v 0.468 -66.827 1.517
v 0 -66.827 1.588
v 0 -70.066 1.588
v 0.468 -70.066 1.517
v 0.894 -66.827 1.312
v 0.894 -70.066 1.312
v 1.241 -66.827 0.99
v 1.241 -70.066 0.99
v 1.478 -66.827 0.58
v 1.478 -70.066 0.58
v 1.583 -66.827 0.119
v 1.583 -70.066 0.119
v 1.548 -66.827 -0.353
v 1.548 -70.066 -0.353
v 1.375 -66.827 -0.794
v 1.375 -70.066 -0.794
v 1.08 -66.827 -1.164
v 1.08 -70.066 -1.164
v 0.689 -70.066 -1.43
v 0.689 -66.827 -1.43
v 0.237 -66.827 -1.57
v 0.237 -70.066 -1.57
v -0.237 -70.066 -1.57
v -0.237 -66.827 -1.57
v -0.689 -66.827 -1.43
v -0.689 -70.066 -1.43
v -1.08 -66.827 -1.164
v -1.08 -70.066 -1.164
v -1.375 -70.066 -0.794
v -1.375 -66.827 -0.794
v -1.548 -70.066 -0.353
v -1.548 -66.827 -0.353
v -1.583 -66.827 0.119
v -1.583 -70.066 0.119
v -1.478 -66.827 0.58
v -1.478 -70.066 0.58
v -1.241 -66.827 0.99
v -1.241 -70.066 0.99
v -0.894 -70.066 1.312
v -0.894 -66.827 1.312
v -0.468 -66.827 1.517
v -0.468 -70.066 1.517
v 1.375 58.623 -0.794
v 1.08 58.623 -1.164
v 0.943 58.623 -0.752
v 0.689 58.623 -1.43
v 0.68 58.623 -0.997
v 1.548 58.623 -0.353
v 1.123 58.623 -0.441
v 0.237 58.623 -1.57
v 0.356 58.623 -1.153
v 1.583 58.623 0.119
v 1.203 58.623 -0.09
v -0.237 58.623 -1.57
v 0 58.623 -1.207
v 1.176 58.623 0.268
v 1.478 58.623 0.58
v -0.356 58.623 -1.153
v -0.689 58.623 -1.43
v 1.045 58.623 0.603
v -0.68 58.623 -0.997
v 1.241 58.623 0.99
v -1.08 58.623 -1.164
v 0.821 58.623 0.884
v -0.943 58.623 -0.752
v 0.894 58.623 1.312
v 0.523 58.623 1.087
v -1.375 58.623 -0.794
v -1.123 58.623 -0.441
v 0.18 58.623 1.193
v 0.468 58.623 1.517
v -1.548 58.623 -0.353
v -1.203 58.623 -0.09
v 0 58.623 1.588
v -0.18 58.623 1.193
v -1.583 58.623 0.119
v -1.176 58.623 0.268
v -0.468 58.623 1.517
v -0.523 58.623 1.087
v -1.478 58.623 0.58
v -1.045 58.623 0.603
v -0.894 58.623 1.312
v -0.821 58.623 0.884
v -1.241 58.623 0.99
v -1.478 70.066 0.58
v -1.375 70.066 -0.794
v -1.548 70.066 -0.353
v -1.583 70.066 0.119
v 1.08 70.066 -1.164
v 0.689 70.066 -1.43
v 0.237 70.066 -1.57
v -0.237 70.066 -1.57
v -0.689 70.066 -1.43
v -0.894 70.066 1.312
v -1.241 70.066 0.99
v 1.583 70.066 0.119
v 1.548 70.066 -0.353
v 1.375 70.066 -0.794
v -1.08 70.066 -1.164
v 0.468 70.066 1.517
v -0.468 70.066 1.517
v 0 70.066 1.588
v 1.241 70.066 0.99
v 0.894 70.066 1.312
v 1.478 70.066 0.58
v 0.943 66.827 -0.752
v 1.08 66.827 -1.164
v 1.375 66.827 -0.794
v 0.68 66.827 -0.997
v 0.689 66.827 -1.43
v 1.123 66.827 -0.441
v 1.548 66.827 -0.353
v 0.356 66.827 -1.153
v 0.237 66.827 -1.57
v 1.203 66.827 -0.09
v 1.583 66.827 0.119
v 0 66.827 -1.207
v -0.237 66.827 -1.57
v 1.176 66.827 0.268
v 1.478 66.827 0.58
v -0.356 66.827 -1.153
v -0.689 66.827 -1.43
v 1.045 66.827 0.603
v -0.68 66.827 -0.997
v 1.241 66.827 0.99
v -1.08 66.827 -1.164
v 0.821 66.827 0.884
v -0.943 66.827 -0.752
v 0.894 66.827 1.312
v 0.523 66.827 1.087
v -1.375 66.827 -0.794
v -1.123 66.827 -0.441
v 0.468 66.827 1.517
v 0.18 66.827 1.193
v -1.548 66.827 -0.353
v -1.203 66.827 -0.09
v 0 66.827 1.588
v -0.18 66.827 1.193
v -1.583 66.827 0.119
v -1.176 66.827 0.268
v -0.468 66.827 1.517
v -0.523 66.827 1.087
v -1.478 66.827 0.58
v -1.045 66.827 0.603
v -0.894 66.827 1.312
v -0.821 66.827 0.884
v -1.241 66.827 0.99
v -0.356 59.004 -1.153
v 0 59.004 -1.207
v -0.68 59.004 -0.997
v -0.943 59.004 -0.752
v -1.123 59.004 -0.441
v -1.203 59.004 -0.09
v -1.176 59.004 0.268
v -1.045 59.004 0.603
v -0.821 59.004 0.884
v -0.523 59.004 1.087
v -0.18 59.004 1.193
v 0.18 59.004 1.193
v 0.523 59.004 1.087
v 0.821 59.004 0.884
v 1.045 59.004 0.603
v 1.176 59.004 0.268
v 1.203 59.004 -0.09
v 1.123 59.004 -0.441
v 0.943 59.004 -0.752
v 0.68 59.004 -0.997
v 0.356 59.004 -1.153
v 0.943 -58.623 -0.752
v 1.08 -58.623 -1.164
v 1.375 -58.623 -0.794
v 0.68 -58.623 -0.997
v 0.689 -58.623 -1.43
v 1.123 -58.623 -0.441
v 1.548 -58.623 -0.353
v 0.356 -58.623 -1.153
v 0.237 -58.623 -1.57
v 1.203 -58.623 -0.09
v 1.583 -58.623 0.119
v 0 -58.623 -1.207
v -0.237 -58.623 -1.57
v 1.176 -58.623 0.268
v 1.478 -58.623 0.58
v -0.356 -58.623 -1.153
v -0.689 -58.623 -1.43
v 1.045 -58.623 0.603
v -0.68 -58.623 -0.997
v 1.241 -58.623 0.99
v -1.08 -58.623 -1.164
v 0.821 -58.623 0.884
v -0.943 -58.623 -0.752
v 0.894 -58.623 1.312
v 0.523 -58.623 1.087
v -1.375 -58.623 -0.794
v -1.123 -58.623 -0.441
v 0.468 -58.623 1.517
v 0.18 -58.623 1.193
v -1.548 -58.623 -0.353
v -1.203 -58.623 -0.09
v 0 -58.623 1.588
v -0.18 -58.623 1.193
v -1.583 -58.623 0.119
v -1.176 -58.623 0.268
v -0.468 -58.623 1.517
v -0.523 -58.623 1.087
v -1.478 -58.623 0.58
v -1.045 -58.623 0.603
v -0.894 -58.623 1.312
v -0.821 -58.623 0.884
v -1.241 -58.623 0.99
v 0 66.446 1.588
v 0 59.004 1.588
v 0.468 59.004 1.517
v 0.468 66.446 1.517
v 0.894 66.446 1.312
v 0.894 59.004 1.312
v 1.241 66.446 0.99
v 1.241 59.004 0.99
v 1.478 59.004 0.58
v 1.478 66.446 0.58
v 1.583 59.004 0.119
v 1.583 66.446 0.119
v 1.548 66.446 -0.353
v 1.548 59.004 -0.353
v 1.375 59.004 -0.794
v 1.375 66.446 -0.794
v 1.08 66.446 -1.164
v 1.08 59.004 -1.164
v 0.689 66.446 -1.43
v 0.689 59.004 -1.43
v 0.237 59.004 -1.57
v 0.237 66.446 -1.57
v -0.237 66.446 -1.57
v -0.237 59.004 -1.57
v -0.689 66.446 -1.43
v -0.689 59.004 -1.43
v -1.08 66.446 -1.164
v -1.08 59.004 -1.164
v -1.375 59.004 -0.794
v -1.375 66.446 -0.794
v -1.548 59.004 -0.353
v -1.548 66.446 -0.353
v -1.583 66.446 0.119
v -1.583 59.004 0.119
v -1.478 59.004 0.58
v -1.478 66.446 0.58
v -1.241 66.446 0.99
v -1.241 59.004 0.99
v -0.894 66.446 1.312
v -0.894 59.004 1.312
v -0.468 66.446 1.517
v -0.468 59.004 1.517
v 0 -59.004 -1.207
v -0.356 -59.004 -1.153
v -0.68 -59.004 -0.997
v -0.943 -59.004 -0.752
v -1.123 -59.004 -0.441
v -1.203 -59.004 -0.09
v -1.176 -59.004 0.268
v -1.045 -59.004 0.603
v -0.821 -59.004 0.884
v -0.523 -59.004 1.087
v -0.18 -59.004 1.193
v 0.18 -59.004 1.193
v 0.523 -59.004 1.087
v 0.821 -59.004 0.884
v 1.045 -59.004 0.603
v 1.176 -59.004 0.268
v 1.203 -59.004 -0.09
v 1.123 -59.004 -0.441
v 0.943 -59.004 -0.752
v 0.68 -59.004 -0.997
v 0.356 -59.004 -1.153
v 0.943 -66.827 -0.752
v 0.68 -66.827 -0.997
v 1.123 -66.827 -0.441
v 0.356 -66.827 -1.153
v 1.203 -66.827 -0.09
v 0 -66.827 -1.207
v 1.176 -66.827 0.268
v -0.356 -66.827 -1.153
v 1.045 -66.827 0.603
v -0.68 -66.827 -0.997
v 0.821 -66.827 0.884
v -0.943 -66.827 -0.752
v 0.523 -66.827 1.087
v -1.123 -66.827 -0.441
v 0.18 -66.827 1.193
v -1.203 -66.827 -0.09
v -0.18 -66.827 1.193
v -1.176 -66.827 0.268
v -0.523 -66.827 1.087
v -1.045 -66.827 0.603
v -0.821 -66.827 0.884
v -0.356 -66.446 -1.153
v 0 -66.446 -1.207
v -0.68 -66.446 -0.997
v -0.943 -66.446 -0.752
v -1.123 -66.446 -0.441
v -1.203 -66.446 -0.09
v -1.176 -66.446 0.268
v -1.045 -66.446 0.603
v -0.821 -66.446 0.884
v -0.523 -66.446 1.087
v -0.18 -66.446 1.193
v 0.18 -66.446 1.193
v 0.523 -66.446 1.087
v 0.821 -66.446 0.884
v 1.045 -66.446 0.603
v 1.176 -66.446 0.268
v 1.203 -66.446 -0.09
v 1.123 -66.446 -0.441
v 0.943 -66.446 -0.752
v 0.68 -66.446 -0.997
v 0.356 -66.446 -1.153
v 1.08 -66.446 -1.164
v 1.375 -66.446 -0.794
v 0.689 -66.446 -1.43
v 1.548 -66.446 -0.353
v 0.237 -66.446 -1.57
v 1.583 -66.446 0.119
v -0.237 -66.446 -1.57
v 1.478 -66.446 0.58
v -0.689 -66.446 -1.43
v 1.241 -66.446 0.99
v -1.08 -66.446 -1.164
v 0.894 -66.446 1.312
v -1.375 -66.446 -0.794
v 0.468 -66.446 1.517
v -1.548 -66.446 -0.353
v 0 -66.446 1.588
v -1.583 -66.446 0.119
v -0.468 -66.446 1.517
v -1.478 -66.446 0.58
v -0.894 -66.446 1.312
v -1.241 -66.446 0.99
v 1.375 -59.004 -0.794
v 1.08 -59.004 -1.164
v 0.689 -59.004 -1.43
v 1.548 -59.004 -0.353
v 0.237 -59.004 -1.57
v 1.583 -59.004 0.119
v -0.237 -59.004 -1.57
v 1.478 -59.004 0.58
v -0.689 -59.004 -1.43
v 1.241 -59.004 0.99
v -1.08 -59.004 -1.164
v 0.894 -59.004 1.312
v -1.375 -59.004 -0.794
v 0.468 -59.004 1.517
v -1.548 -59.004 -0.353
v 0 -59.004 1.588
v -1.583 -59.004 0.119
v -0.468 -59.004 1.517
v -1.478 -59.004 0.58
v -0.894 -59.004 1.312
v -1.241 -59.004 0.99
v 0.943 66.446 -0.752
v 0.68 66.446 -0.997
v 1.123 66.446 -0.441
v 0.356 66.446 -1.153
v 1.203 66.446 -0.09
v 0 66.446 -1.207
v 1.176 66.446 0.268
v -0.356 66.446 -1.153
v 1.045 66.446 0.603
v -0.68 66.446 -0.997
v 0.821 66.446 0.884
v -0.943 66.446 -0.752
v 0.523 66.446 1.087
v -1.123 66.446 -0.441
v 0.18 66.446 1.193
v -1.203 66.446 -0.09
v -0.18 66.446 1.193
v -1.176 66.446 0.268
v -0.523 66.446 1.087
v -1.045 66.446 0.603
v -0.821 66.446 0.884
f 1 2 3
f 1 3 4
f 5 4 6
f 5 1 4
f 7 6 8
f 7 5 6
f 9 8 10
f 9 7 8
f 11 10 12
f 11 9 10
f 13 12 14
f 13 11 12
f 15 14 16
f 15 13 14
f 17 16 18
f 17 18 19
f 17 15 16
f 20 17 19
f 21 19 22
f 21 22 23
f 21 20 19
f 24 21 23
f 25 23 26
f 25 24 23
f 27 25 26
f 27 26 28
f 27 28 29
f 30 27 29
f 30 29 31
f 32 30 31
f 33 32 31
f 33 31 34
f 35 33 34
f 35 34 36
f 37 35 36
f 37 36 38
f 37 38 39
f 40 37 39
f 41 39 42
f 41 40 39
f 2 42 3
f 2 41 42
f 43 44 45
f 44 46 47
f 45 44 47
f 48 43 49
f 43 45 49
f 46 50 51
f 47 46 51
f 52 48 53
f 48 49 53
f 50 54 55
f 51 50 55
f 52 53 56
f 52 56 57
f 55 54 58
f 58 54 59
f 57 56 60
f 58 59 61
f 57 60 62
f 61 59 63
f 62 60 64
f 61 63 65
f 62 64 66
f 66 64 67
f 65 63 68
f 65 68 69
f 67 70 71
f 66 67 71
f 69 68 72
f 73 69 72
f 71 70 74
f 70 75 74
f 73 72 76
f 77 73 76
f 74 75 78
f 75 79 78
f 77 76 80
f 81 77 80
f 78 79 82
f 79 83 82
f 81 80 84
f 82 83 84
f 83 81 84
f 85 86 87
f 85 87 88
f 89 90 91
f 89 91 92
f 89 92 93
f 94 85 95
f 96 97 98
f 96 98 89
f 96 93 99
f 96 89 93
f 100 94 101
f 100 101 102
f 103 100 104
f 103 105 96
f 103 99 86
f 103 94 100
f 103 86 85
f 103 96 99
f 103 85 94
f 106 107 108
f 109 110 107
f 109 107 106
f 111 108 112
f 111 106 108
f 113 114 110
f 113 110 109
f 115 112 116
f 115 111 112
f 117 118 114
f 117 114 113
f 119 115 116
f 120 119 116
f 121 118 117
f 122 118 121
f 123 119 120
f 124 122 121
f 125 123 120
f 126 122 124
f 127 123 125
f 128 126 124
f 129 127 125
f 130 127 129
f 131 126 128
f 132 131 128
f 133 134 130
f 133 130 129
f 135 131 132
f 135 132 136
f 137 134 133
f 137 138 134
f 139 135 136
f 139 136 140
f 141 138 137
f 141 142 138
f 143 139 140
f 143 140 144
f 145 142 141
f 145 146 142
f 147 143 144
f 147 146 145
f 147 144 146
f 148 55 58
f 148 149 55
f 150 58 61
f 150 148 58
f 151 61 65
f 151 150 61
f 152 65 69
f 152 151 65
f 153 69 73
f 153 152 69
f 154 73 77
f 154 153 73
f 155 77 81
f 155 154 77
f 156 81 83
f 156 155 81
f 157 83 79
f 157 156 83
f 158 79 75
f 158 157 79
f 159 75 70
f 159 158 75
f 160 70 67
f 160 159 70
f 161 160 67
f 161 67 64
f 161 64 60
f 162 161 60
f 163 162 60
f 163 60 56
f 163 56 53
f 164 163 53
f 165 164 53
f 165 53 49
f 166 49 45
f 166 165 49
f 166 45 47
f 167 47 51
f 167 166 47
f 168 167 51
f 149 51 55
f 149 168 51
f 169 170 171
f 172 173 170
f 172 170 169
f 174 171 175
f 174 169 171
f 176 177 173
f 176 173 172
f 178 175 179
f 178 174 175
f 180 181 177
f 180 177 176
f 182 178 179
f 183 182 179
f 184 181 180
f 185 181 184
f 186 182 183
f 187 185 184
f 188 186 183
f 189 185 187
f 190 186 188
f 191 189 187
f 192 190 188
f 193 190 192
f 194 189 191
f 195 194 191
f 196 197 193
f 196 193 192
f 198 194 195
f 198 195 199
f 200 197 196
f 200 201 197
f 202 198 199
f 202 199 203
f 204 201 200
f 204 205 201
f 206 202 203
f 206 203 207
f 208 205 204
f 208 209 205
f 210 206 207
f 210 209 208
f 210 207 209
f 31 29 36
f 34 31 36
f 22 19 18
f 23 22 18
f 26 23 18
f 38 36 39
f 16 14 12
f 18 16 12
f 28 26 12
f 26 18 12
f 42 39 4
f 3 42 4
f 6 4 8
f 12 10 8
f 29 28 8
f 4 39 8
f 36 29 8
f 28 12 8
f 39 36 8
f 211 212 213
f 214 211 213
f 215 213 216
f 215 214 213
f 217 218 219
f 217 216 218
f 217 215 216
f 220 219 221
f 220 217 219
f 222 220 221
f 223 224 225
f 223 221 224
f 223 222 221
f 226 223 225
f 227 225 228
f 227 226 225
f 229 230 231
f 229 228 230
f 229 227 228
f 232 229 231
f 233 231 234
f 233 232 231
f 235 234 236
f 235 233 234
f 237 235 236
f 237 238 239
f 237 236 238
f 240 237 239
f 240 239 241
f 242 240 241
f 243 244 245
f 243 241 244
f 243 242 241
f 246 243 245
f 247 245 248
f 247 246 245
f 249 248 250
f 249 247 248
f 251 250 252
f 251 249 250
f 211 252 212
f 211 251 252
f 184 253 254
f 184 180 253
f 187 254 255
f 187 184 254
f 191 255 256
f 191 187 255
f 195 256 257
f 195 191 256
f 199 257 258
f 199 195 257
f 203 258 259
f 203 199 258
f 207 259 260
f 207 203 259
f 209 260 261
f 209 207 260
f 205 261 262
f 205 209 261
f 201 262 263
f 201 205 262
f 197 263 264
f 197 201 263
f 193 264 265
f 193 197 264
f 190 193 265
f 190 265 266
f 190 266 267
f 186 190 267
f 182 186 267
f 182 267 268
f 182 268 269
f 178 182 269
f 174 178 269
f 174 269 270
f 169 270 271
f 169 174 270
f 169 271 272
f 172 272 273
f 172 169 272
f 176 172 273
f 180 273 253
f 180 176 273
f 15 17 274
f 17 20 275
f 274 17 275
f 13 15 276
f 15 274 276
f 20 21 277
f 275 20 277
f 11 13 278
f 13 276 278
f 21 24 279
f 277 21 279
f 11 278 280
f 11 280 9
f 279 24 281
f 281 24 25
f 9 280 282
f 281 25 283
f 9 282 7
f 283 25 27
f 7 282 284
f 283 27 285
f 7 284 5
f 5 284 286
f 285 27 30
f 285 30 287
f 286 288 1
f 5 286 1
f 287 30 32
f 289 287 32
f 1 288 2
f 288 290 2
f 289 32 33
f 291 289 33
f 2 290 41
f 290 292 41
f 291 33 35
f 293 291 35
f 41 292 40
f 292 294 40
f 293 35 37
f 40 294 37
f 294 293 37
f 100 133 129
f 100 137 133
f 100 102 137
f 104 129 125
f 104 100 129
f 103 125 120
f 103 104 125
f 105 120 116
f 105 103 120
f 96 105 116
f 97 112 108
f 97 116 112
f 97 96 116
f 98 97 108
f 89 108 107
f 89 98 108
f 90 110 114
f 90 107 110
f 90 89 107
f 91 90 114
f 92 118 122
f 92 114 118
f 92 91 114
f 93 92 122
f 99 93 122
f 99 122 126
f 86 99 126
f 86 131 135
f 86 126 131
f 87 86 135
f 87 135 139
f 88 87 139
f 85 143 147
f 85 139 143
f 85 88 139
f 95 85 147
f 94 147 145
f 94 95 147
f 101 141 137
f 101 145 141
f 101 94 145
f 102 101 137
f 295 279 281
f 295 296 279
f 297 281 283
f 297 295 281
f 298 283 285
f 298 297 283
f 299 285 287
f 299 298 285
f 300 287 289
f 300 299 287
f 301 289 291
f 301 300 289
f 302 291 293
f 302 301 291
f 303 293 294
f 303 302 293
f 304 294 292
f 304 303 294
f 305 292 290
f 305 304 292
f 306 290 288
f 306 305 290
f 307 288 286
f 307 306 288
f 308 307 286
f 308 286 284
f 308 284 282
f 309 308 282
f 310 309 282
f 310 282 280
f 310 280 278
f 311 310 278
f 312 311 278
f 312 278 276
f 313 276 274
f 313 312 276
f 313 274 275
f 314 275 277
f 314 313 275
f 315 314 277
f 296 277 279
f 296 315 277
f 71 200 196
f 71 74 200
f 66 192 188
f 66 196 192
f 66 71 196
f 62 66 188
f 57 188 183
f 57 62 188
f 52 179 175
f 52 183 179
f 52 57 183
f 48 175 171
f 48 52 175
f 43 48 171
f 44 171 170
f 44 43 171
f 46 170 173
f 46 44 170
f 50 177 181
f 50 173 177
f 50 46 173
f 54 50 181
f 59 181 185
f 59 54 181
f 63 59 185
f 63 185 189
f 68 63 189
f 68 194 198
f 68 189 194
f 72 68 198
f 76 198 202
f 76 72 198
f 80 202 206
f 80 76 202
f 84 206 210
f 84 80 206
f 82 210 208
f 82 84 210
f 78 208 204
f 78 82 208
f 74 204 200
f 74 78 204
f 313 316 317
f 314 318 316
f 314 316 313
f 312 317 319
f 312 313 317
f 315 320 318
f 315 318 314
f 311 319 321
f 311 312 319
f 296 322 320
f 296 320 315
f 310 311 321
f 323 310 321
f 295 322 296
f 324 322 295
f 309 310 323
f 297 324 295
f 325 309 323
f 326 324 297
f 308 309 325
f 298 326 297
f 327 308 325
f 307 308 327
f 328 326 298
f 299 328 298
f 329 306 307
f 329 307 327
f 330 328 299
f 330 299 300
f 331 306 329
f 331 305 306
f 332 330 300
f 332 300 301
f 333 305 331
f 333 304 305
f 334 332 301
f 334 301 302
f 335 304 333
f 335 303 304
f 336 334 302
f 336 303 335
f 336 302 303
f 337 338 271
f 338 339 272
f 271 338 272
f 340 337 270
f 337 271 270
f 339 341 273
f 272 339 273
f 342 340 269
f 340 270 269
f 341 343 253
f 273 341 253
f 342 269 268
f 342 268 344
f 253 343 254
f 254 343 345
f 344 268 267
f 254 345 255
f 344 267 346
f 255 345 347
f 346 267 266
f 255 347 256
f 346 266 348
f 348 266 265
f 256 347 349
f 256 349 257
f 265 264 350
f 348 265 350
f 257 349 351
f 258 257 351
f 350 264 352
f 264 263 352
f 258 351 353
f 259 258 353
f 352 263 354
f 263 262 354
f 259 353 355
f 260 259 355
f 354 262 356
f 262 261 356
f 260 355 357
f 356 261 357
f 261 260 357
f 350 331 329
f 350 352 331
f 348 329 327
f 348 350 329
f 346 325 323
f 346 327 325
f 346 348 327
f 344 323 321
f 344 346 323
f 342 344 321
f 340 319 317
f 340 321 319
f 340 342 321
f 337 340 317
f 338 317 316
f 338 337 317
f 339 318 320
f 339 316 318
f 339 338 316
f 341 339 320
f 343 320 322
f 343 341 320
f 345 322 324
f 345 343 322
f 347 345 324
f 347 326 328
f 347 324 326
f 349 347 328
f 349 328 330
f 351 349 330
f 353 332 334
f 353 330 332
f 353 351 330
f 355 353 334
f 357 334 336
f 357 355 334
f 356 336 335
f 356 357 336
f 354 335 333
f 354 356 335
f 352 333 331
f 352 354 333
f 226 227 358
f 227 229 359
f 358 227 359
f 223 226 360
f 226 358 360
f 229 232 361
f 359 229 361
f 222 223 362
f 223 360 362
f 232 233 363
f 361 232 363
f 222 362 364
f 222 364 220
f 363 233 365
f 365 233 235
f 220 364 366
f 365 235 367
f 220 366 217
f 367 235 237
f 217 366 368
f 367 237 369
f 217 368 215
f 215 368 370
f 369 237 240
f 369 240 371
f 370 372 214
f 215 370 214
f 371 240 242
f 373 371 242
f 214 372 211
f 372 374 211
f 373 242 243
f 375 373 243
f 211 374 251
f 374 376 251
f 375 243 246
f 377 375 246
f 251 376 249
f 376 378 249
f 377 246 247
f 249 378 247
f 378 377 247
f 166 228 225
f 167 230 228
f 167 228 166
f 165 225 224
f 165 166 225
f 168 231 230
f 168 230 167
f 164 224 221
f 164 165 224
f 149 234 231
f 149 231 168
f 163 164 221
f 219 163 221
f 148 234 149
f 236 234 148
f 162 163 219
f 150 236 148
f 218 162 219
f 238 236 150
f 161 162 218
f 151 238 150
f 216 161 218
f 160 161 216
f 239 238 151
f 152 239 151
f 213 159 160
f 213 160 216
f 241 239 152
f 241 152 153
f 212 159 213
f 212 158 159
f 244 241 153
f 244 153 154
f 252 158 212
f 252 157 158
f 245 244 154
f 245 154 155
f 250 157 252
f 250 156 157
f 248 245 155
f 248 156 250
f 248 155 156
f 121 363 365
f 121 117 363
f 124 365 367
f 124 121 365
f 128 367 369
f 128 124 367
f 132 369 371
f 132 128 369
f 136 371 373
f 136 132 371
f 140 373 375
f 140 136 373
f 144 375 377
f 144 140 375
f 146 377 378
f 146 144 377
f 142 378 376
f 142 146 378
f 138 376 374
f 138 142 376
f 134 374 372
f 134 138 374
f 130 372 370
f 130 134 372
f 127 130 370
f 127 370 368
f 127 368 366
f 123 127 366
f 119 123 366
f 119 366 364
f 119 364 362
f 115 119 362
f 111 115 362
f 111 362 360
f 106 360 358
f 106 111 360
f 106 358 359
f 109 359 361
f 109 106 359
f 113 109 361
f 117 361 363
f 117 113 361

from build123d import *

# Parameters (mm, degrees)
SKETCH1_R           = 1.5875
BOSS_EXTRUDE1_DEPTH = 70.0659
SKETCH2_W           = 0.381
SKETCH2_H           = 0.381


with BuildPart() as part:
    # Sketch1 → Boss-Extrude1 (new, symmetric)
    with BuildSketch(Plane(origin=(0, 0, 0), x_dir=(1, 0, 0), z_dir=(0, 1, 0))):
        with Locations(Location((0, 0, 0), (0, 0, 270))):
            Circle(SKETCH1_R)
    extrude(amount=BOSS_EXTRUDE1_DEPTH, both=True)

    # Sketch2 → Cut-Revolve1 (revolve, cut)
    with BuildSketch(Plane.XY, mode=Mode.PRIVATE) as cut_revolve1_sk:
        with Locations((1.397, 58.8137)):
            Rectangle(SKETCH2_W, SKETCH2_H)
        with Locations((1.397, -58.8137)):
            Rectangle(SKETCH2_W, SKETCH2_H)
        with Locations((1.397, 66.6369)):
            Rectangle(SKETCH2_W, SKETCH2_H)
        with Locations((1.397, -66.6369)):
            Rectangle(SKETCH2_W, SKETCH2_H)
    revolve(cut_revolve1_sk.sketch.rotate(Axis((0, -58.6232, 0), (0, 1, 0)), 90), axis=Axis((0, -58.6232, 0), (0, 1, 0)), mode=Mode.SUBTRACT)


solid = part.part
